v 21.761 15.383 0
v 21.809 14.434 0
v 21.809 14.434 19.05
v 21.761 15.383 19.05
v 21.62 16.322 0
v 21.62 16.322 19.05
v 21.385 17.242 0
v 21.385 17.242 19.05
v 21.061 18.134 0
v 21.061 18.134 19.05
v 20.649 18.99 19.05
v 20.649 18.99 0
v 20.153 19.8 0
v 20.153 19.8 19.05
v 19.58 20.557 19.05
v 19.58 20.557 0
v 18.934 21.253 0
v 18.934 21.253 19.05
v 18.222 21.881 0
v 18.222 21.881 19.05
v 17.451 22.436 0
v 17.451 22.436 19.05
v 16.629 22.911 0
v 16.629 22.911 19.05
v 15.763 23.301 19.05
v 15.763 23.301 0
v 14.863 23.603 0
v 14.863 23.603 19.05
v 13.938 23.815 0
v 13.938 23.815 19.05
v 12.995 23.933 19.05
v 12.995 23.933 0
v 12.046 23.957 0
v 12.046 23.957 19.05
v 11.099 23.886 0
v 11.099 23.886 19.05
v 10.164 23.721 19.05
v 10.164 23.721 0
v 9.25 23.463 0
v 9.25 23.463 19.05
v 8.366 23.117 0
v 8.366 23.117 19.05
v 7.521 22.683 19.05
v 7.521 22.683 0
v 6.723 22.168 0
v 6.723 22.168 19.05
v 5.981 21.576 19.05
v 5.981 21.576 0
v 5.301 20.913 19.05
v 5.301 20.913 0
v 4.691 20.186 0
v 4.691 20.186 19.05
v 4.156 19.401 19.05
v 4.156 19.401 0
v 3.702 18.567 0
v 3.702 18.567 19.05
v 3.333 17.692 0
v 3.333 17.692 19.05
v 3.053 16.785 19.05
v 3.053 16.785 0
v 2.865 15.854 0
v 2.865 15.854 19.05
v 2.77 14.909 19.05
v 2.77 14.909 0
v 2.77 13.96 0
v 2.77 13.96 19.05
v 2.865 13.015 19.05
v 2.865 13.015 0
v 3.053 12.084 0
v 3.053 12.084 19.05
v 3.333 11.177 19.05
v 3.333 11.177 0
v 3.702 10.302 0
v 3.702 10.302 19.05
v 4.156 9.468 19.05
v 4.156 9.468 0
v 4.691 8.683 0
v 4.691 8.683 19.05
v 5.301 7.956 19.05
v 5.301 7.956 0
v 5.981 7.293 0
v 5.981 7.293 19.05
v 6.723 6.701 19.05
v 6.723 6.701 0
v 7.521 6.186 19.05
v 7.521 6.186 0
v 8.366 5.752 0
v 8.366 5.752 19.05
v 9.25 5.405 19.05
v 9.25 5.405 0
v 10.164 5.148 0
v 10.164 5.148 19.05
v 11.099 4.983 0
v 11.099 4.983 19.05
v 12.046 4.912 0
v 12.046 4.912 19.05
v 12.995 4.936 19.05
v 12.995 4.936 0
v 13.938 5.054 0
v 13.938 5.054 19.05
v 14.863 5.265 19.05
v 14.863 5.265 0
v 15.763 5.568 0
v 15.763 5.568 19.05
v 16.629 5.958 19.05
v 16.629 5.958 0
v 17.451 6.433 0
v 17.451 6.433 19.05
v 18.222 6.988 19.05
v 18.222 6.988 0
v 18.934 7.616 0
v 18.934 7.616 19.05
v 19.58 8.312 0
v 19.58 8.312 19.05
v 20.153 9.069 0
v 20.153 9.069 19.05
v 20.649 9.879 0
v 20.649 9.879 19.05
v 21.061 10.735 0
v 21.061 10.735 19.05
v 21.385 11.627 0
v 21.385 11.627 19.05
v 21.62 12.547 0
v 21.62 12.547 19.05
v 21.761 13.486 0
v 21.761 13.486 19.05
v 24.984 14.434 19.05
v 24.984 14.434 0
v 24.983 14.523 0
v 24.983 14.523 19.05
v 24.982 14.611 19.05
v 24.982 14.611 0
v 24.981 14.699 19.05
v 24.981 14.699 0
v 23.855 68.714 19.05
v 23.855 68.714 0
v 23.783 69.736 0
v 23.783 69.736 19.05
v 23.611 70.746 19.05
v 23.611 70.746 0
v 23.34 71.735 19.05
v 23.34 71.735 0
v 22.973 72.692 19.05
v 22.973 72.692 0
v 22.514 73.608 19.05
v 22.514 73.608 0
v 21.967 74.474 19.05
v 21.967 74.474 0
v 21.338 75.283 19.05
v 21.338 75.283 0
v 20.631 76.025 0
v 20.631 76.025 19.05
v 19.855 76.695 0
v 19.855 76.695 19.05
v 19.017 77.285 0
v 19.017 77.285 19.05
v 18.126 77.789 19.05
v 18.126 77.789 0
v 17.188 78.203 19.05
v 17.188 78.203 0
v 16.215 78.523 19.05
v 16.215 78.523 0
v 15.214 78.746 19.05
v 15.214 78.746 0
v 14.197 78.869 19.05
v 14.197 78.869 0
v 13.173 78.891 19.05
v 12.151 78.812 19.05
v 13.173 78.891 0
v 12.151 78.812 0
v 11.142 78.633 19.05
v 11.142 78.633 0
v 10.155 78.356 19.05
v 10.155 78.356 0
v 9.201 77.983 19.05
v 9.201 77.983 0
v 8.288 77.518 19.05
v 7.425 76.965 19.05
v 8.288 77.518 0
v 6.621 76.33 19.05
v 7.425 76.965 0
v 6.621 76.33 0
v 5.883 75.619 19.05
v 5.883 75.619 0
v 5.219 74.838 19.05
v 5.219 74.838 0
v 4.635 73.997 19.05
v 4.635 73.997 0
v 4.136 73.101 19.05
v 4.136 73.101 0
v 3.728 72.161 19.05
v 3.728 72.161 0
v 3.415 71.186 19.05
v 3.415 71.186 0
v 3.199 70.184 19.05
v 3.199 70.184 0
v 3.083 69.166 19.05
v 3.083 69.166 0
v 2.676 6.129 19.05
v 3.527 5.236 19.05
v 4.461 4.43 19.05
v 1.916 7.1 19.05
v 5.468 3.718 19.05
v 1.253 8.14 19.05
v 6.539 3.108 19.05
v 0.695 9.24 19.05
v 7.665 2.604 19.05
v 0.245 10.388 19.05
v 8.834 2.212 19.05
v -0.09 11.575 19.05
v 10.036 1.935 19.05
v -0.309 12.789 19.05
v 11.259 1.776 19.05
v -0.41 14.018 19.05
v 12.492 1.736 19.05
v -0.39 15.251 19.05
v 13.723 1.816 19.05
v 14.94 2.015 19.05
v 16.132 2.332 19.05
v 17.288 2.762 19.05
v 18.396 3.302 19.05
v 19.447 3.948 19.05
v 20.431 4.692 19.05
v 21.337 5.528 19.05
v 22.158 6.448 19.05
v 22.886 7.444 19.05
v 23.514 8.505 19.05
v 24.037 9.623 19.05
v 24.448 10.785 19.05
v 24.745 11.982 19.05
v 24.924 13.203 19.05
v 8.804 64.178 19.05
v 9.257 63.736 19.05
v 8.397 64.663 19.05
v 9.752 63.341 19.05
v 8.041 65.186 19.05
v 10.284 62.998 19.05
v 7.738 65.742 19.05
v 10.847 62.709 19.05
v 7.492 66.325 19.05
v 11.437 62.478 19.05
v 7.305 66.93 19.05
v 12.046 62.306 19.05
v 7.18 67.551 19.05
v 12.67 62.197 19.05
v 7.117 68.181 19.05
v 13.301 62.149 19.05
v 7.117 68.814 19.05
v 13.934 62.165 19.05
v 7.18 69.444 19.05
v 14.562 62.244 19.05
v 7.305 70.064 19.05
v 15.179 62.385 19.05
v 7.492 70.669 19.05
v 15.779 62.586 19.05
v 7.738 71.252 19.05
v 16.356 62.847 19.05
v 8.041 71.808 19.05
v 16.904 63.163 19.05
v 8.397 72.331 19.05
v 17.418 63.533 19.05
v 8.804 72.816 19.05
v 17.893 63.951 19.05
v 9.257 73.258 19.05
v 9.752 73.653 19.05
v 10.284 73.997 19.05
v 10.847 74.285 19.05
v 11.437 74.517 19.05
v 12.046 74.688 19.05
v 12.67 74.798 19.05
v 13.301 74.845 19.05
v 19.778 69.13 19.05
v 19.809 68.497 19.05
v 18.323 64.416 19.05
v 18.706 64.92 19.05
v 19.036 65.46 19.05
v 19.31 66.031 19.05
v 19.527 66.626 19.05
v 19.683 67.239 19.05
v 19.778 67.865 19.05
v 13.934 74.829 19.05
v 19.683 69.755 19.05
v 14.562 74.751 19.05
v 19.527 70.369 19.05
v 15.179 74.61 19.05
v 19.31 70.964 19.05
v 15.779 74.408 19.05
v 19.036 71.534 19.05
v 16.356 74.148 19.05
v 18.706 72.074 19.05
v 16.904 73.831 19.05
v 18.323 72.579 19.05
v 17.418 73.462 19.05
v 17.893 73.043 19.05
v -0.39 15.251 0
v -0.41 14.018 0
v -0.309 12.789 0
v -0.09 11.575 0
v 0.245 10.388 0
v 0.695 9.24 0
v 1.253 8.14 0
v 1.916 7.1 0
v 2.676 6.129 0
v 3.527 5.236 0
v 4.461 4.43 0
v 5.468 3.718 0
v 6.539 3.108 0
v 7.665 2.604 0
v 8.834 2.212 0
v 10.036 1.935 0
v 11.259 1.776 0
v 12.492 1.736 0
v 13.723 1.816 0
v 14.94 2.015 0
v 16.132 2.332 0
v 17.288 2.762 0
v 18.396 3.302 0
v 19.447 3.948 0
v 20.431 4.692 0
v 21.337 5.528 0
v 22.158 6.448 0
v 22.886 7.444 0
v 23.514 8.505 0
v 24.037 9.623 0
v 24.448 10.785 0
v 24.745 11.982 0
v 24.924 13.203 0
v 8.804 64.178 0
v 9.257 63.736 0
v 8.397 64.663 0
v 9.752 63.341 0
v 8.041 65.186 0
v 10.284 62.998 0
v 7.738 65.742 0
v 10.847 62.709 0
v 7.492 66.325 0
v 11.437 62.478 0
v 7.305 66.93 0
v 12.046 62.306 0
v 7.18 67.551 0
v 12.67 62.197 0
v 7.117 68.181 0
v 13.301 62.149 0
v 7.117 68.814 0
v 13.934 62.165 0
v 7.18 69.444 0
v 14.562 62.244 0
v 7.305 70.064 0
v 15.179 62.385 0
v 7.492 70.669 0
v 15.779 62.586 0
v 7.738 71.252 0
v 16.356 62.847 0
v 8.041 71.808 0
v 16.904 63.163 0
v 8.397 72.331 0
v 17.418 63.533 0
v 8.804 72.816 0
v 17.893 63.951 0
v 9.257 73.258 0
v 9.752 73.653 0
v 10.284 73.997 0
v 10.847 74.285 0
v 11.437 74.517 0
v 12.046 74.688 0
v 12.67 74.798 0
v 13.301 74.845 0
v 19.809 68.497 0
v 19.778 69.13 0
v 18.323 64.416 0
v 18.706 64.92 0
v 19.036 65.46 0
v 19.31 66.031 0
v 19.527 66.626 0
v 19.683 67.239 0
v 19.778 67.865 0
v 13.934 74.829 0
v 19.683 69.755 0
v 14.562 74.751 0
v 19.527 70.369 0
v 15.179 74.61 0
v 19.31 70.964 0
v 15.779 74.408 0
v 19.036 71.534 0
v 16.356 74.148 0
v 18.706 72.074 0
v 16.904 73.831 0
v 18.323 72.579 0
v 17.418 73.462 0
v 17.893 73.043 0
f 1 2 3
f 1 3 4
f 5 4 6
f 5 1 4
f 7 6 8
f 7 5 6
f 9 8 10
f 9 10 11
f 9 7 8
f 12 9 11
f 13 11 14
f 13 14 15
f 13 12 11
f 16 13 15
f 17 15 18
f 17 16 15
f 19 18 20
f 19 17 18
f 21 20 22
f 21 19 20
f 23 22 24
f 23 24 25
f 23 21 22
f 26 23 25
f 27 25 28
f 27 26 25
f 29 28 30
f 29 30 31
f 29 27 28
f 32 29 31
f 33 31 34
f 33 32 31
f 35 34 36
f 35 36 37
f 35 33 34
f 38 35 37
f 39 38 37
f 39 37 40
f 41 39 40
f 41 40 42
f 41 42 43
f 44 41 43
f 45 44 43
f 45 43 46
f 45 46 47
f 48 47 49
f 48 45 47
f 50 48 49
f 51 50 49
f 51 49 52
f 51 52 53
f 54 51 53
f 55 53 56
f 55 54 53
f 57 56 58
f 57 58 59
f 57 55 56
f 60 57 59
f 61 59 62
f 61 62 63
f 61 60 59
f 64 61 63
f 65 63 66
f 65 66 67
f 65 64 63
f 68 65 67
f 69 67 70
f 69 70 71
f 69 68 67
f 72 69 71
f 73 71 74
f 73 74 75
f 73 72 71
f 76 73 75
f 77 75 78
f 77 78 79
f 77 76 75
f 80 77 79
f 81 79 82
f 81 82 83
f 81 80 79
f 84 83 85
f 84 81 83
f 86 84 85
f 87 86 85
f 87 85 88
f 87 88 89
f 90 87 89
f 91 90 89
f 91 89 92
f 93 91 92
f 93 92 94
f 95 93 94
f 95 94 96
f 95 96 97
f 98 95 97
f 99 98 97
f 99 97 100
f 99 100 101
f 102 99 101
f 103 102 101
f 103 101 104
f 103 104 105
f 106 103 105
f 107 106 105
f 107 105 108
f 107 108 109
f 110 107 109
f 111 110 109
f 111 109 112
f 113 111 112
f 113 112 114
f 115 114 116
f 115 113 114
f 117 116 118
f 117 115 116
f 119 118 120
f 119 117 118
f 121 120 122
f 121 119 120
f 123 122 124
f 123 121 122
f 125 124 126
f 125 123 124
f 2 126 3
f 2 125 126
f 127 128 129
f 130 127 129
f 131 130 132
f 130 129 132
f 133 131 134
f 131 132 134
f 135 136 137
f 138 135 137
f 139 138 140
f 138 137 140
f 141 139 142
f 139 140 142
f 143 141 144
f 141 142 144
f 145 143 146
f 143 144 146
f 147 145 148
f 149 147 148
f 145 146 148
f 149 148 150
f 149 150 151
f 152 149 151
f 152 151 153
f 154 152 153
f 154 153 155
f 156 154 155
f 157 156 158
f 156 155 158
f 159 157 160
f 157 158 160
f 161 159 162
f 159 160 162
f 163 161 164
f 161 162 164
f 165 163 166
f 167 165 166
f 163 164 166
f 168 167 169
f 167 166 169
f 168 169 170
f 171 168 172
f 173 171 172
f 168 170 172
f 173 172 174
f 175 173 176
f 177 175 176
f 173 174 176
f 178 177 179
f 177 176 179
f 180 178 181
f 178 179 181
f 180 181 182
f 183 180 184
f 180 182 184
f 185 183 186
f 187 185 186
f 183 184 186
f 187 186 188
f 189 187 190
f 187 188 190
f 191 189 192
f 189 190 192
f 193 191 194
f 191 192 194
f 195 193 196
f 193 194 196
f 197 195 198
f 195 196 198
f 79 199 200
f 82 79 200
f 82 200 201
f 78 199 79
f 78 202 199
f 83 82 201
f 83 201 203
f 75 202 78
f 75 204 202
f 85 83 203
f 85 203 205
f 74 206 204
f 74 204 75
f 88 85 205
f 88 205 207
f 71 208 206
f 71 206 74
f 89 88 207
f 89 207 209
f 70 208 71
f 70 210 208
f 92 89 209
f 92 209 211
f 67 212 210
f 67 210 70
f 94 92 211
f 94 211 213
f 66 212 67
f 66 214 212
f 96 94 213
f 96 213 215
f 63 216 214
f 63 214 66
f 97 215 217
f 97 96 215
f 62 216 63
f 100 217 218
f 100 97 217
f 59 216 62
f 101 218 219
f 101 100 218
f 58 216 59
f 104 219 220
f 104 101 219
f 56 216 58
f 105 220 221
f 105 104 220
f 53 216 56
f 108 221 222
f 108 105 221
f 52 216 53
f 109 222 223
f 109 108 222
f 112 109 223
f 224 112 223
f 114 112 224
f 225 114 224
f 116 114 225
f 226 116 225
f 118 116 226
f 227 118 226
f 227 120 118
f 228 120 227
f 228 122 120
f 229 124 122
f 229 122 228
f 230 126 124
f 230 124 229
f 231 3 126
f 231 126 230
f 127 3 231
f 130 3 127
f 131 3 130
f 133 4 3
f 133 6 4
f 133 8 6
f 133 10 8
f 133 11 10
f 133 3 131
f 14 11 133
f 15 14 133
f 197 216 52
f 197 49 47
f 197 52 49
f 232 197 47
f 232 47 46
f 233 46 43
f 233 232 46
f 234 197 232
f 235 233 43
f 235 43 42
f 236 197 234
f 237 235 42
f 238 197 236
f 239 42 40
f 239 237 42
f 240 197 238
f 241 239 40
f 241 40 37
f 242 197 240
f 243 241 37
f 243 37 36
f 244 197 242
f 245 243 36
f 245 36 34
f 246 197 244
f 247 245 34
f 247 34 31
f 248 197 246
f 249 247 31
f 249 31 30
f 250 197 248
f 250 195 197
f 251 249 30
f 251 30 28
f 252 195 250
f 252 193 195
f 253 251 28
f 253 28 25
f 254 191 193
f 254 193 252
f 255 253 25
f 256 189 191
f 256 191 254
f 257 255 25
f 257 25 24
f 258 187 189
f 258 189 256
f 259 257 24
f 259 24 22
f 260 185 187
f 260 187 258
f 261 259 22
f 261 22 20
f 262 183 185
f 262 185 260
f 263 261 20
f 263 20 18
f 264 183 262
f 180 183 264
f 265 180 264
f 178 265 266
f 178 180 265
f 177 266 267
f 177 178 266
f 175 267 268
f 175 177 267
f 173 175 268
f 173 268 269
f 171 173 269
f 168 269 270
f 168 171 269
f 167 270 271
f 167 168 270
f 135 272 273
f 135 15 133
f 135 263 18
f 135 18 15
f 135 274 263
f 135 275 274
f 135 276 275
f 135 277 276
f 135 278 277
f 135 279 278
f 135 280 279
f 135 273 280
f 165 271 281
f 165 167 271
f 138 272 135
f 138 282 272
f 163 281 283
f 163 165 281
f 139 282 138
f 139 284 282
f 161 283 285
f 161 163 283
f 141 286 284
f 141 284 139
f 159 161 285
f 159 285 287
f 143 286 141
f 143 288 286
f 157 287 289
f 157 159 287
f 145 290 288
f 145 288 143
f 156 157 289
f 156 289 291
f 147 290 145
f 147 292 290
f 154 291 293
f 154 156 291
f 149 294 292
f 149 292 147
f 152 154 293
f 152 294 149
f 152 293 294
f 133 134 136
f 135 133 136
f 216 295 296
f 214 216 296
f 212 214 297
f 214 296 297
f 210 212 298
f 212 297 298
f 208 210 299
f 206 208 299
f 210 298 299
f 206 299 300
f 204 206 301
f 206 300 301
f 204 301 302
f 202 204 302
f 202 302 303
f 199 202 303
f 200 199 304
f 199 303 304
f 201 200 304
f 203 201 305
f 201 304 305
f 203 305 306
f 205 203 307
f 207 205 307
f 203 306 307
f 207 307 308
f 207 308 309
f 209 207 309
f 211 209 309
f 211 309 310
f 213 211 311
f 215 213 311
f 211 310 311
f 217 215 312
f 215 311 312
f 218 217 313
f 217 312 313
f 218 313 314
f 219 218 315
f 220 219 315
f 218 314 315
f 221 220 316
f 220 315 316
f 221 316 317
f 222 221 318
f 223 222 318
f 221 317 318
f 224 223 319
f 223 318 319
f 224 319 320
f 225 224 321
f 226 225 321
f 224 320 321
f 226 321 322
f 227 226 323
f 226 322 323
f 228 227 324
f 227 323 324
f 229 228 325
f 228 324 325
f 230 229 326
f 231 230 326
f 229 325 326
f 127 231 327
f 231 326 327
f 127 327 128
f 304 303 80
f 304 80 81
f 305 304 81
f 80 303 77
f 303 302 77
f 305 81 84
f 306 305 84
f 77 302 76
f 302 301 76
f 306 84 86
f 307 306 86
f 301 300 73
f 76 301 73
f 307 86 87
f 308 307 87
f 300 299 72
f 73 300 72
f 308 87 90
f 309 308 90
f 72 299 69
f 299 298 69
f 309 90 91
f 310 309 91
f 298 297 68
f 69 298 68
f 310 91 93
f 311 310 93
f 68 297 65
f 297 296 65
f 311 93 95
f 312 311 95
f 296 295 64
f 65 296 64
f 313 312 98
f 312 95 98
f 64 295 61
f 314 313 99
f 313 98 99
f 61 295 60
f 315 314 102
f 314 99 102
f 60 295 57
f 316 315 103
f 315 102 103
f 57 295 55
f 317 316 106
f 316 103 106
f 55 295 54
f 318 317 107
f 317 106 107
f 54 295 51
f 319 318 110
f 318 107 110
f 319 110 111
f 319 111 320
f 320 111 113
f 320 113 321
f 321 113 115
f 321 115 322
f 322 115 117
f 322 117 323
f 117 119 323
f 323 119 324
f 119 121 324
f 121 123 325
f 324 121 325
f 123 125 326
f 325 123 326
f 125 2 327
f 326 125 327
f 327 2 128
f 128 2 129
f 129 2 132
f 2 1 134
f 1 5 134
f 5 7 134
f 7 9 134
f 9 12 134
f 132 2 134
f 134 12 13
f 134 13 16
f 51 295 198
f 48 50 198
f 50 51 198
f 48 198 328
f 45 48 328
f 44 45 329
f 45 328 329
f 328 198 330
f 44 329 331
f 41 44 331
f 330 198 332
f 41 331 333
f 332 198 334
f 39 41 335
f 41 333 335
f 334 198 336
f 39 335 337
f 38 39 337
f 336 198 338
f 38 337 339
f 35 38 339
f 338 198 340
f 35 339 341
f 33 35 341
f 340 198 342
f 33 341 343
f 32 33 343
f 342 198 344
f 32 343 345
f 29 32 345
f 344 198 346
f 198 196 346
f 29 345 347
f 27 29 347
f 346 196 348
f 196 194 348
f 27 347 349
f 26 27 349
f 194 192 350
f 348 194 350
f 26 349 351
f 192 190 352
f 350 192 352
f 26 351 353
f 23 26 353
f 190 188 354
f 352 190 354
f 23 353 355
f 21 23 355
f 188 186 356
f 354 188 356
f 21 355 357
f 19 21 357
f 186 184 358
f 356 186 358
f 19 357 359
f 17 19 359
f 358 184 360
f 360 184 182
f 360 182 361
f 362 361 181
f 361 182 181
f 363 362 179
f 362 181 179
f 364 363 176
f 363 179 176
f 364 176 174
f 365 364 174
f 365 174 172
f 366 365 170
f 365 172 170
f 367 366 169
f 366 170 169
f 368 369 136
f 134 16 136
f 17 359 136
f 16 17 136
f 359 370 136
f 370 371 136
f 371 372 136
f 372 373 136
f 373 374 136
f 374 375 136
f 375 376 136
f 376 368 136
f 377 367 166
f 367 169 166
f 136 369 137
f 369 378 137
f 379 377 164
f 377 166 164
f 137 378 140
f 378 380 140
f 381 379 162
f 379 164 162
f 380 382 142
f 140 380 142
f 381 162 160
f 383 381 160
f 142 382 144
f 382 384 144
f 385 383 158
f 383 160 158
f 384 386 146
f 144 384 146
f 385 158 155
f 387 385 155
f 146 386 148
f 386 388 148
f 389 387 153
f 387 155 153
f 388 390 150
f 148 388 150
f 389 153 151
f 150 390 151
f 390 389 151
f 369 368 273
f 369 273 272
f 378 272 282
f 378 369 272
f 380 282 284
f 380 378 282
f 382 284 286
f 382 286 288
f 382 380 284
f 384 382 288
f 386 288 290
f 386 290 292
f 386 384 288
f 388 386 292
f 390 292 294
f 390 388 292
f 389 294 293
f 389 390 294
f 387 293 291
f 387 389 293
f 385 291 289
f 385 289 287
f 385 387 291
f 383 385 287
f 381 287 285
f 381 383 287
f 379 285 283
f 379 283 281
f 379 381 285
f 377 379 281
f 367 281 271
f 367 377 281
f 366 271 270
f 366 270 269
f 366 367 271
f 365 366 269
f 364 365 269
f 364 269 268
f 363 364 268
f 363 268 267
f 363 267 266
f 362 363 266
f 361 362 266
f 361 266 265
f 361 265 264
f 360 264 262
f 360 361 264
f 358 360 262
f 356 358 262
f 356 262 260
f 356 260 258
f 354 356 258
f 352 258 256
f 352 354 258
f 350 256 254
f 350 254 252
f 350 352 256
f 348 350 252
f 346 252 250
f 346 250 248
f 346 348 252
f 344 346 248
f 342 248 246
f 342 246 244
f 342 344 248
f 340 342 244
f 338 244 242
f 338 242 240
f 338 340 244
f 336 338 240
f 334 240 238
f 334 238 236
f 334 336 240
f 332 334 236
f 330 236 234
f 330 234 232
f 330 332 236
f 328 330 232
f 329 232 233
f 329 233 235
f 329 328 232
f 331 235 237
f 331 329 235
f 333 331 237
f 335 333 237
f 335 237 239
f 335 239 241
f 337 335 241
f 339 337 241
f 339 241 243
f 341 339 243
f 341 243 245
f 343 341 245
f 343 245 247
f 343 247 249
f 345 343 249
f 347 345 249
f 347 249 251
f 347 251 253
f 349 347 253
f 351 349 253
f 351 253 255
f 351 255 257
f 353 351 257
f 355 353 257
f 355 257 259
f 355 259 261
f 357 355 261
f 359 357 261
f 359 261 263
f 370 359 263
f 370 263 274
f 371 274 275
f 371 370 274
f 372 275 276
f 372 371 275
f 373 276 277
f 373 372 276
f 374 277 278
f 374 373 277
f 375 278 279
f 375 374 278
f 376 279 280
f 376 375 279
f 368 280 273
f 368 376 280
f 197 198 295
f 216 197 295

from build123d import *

# Parameters (mm, degrees)
F0_R     = 6.35
F0_R_2   = 9.525
F1_DEPTH = 19.05


with BuildPart() as f1:
    # F0 (on Top) → F1 (new body)
    with BuildSketch(Plane.XY):
        with BuildLine():
            ThreePointArc((23.856802, 68.497253), (23.856237, 68.605633), (23.854543, 68.714001))
            ThreePointArc((23.854543, 68.714001), (13.685154, 78.892486), (3.082928, 69.165676))
            ThreePointArc((3.082928, 69.165676), (13.124727, 58.104941), (23.856802, 68.497253))
        make_face()
        with Locations((13.459112, 68.497253)):
            Circle(F0_R, mode=Mode.SUBTRACT)
        with BuildLine():
            ThreePointArc((-0.390204, 15.250903), (12.559621, 27.131474), (24.980767, 14.699216))
            Line((24.980767, 14.699216), (23.854543, 68.714001))
            ThreePointArc((23.854543, 68.714001), (23.856237, 68.605633), (23.856802, 68.497253))
            ThreePointArc((23.856802, 68.497253), (13.124727, 58.104941), (3.082928, 69.165676))
            Line((3.082928, 69.165676), (-0.390204, 15.250903))
        make_face()
        with BuildLine():
            ThreePointArc((-0.390204, 15.250903), (11.875102, 1.741044), (24.983527, 14.434475))
            ThreePointArc((24.983527, 14.434475), (24.982837, 14.566853), (24.980767, 14.699216))
            ThreePointArc((24.980767, 14.699216), (12.559621, 27.131474), (-0.390204, 15.250903))
        make_face()
        with Locations((12.283527, 14.434475)):
            Circle(F0_R_2, mode=Mode.SUBTRACT)
    extrude(amount=F1_DEPTH)


solid = f1.part
